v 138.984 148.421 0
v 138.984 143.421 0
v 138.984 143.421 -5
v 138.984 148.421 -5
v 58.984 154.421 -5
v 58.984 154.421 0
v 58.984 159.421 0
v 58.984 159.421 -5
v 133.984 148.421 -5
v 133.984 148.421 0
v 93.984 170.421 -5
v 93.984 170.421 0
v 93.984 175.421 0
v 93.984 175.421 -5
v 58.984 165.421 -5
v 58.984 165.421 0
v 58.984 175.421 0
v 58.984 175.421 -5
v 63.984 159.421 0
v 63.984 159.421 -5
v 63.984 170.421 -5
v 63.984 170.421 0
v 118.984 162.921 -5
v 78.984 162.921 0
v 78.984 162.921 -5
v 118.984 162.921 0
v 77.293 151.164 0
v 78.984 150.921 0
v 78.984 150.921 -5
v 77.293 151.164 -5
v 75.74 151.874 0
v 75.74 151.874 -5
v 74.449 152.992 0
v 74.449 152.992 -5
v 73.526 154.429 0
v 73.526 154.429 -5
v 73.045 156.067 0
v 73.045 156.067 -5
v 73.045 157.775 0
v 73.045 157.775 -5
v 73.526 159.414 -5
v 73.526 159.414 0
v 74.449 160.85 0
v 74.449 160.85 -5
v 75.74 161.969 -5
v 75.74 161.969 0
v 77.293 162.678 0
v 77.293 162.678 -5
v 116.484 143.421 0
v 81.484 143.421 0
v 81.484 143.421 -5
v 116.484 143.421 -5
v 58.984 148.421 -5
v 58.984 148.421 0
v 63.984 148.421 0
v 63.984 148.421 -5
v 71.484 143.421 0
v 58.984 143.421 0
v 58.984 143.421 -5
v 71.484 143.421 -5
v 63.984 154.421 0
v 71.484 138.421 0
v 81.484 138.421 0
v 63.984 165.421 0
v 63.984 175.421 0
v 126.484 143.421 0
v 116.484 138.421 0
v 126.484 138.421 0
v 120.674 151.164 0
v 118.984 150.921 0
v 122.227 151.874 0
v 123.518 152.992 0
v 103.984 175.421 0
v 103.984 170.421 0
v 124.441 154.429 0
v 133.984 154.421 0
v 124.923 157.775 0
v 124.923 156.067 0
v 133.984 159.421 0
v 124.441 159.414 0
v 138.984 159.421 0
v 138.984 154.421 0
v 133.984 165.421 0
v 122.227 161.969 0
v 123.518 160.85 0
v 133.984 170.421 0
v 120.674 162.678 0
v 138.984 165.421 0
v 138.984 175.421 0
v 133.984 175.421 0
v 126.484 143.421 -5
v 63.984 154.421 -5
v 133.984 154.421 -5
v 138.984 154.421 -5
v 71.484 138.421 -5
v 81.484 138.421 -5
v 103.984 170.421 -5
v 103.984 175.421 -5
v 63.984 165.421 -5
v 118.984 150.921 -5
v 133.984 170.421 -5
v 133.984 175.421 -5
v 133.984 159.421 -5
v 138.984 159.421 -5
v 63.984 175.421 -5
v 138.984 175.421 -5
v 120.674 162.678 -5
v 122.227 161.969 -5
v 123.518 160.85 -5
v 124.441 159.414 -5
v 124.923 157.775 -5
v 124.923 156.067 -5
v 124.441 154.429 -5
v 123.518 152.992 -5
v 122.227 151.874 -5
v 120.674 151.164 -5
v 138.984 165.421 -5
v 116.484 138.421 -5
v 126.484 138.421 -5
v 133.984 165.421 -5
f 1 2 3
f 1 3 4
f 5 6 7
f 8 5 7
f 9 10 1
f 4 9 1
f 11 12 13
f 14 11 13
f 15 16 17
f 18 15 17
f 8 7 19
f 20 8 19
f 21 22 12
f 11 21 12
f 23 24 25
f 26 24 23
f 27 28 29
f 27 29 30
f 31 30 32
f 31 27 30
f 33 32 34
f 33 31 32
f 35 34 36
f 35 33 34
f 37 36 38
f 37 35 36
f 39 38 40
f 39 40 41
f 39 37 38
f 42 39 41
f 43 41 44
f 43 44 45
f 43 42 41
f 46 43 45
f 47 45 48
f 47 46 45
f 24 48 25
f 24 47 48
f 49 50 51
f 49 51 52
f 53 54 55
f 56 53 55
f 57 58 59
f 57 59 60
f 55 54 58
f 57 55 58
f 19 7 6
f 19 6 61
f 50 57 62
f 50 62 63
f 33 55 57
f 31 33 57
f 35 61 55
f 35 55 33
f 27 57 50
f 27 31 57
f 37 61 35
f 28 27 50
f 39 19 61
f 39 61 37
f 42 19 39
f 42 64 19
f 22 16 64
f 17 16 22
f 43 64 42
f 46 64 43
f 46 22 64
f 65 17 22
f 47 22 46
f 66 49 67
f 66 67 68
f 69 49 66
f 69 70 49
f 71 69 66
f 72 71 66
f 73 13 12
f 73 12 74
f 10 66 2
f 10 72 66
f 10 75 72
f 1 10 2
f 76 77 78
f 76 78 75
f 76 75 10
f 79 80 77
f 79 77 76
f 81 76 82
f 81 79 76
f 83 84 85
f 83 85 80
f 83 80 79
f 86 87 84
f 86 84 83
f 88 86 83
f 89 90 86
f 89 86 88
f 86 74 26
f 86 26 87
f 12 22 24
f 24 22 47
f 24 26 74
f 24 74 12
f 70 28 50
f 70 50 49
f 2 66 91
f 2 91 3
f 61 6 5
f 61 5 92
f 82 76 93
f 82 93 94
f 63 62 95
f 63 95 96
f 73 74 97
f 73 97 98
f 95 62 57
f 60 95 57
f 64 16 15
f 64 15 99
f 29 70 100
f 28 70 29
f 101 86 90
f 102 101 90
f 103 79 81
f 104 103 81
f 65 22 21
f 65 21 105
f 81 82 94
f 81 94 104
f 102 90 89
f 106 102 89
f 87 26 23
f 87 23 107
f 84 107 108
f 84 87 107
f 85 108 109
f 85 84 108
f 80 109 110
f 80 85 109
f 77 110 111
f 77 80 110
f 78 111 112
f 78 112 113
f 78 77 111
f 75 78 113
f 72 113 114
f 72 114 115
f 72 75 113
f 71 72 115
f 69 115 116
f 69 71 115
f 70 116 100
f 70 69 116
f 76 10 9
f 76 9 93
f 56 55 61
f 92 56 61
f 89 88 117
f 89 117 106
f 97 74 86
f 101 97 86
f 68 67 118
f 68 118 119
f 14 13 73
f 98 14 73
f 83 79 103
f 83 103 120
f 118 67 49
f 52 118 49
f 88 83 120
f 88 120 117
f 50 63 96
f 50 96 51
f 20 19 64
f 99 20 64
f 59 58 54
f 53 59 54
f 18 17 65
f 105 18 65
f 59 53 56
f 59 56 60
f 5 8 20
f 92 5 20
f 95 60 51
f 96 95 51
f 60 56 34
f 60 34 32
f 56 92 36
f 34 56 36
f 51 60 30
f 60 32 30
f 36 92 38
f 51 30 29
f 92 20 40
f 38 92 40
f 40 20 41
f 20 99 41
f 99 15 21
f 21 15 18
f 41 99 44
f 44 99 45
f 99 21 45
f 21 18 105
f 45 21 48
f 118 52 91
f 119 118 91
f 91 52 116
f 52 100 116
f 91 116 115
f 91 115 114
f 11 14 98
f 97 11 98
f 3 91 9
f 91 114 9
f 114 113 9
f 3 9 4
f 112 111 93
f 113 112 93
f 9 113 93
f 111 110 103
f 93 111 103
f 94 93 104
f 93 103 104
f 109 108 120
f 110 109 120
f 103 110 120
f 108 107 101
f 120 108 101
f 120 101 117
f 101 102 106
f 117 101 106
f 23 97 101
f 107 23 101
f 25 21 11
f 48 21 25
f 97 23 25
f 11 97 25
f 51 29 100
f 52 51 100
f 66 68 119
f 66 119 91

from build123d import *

# Parameters (mm, degrees)
ESQUISSE1_W        = 80
ESQUISSE1_H        = 27
BOSS_EXTRU_1_DEPTH = 5
ESQUISSE3_W        = 5
ESQUISSE3_H        = 6
CR_NEAUX_DEPTH     = 5
ESQUISSE2_W        = 5
ESQUISSE2_H        = 5
ESQUISSE2_W_2      = 10
CR_NEAUX_2_DEPTH   = 5


with BuildPart() as part:
    # Esquisse1 → Boss.-Extru.1 (new body)
    with BuildSketch(Plane.XY):
        with Locations((98.983627477, 156.921111622)):
            Rectangle(ESQUISSE1_W, ESQUISSE1_H)
    extrude(amount=-BOSS_EXTRU_1_DEPTH)

    # Esquisse3 → Cr_neaux (cut)
    with BuildSketch(Plane.XY):
        with Locations((61.483627477, 162.421111622)):
            Rectangle(ESQUISSE3_W, ESQUISSE3_H)
        with Locations((61.483627477, 151.421111622)):
            Rectangle(ESQUISSE3_W, ESQUISSE3_H)
        with Locations((136.483627477, 151.421111622)):
            Rectangle(ESQUISSE3_W, ESQUISSE3_H)
        with Locations((136.483627477, 162.421111622)):
            Rectangle(ESQUISSE3_W, ESQUISSE3_H)
        with BuildLine():
            Line((78.983627477, 162.921111622), (118.983627477, 162.921111622))
            ThreePointArc((118.983627477, 162.921111622), (124.983627477, 156.921111622), (118.983627477, 150.921111622))
            Line((118.983627477, 150.921111622), (78.983627477, 150.921111622))
            ThreePointArc((78.983627477, 150.921111622), (72.983627477, 156.921111622), (78.983627477, 162.921111622))
        make_face()
    extrude(amount=-CR_NEAUX_DEPTH, mode=Mode.SUBTRACT)

    # Esquisse2 → Cr_neaux 2 (add)
    with BuildSketch(Plane.XY):
        with Locations((136.483627477, 172.921111622)):
            Rectangle(ESQUISSE2_W, ESQUISSE2_H)
        with Locations((61.483627477, 172.921111622)):
            Rectangle(ESQUISSE2_W, ESQUISSE2_H)
        with Locations((98.983627477, 172.921111622)):
            Rectangle(ESQUISSE2_W_2, ESQUISSE2_H)
        with Locations((121.483627477, 140.921111622)):
            Rectangle(ESQUISSE2_W_2, ESQUISSE2_H)
        with Locations((76.483627477, 140.921111622)):
            Rectangle(ESQUISSE2_W_2, ESQUISSE2_H)
    extrude(amount=-CR_NEAUX_2_DEPTH)


solid = part.part
